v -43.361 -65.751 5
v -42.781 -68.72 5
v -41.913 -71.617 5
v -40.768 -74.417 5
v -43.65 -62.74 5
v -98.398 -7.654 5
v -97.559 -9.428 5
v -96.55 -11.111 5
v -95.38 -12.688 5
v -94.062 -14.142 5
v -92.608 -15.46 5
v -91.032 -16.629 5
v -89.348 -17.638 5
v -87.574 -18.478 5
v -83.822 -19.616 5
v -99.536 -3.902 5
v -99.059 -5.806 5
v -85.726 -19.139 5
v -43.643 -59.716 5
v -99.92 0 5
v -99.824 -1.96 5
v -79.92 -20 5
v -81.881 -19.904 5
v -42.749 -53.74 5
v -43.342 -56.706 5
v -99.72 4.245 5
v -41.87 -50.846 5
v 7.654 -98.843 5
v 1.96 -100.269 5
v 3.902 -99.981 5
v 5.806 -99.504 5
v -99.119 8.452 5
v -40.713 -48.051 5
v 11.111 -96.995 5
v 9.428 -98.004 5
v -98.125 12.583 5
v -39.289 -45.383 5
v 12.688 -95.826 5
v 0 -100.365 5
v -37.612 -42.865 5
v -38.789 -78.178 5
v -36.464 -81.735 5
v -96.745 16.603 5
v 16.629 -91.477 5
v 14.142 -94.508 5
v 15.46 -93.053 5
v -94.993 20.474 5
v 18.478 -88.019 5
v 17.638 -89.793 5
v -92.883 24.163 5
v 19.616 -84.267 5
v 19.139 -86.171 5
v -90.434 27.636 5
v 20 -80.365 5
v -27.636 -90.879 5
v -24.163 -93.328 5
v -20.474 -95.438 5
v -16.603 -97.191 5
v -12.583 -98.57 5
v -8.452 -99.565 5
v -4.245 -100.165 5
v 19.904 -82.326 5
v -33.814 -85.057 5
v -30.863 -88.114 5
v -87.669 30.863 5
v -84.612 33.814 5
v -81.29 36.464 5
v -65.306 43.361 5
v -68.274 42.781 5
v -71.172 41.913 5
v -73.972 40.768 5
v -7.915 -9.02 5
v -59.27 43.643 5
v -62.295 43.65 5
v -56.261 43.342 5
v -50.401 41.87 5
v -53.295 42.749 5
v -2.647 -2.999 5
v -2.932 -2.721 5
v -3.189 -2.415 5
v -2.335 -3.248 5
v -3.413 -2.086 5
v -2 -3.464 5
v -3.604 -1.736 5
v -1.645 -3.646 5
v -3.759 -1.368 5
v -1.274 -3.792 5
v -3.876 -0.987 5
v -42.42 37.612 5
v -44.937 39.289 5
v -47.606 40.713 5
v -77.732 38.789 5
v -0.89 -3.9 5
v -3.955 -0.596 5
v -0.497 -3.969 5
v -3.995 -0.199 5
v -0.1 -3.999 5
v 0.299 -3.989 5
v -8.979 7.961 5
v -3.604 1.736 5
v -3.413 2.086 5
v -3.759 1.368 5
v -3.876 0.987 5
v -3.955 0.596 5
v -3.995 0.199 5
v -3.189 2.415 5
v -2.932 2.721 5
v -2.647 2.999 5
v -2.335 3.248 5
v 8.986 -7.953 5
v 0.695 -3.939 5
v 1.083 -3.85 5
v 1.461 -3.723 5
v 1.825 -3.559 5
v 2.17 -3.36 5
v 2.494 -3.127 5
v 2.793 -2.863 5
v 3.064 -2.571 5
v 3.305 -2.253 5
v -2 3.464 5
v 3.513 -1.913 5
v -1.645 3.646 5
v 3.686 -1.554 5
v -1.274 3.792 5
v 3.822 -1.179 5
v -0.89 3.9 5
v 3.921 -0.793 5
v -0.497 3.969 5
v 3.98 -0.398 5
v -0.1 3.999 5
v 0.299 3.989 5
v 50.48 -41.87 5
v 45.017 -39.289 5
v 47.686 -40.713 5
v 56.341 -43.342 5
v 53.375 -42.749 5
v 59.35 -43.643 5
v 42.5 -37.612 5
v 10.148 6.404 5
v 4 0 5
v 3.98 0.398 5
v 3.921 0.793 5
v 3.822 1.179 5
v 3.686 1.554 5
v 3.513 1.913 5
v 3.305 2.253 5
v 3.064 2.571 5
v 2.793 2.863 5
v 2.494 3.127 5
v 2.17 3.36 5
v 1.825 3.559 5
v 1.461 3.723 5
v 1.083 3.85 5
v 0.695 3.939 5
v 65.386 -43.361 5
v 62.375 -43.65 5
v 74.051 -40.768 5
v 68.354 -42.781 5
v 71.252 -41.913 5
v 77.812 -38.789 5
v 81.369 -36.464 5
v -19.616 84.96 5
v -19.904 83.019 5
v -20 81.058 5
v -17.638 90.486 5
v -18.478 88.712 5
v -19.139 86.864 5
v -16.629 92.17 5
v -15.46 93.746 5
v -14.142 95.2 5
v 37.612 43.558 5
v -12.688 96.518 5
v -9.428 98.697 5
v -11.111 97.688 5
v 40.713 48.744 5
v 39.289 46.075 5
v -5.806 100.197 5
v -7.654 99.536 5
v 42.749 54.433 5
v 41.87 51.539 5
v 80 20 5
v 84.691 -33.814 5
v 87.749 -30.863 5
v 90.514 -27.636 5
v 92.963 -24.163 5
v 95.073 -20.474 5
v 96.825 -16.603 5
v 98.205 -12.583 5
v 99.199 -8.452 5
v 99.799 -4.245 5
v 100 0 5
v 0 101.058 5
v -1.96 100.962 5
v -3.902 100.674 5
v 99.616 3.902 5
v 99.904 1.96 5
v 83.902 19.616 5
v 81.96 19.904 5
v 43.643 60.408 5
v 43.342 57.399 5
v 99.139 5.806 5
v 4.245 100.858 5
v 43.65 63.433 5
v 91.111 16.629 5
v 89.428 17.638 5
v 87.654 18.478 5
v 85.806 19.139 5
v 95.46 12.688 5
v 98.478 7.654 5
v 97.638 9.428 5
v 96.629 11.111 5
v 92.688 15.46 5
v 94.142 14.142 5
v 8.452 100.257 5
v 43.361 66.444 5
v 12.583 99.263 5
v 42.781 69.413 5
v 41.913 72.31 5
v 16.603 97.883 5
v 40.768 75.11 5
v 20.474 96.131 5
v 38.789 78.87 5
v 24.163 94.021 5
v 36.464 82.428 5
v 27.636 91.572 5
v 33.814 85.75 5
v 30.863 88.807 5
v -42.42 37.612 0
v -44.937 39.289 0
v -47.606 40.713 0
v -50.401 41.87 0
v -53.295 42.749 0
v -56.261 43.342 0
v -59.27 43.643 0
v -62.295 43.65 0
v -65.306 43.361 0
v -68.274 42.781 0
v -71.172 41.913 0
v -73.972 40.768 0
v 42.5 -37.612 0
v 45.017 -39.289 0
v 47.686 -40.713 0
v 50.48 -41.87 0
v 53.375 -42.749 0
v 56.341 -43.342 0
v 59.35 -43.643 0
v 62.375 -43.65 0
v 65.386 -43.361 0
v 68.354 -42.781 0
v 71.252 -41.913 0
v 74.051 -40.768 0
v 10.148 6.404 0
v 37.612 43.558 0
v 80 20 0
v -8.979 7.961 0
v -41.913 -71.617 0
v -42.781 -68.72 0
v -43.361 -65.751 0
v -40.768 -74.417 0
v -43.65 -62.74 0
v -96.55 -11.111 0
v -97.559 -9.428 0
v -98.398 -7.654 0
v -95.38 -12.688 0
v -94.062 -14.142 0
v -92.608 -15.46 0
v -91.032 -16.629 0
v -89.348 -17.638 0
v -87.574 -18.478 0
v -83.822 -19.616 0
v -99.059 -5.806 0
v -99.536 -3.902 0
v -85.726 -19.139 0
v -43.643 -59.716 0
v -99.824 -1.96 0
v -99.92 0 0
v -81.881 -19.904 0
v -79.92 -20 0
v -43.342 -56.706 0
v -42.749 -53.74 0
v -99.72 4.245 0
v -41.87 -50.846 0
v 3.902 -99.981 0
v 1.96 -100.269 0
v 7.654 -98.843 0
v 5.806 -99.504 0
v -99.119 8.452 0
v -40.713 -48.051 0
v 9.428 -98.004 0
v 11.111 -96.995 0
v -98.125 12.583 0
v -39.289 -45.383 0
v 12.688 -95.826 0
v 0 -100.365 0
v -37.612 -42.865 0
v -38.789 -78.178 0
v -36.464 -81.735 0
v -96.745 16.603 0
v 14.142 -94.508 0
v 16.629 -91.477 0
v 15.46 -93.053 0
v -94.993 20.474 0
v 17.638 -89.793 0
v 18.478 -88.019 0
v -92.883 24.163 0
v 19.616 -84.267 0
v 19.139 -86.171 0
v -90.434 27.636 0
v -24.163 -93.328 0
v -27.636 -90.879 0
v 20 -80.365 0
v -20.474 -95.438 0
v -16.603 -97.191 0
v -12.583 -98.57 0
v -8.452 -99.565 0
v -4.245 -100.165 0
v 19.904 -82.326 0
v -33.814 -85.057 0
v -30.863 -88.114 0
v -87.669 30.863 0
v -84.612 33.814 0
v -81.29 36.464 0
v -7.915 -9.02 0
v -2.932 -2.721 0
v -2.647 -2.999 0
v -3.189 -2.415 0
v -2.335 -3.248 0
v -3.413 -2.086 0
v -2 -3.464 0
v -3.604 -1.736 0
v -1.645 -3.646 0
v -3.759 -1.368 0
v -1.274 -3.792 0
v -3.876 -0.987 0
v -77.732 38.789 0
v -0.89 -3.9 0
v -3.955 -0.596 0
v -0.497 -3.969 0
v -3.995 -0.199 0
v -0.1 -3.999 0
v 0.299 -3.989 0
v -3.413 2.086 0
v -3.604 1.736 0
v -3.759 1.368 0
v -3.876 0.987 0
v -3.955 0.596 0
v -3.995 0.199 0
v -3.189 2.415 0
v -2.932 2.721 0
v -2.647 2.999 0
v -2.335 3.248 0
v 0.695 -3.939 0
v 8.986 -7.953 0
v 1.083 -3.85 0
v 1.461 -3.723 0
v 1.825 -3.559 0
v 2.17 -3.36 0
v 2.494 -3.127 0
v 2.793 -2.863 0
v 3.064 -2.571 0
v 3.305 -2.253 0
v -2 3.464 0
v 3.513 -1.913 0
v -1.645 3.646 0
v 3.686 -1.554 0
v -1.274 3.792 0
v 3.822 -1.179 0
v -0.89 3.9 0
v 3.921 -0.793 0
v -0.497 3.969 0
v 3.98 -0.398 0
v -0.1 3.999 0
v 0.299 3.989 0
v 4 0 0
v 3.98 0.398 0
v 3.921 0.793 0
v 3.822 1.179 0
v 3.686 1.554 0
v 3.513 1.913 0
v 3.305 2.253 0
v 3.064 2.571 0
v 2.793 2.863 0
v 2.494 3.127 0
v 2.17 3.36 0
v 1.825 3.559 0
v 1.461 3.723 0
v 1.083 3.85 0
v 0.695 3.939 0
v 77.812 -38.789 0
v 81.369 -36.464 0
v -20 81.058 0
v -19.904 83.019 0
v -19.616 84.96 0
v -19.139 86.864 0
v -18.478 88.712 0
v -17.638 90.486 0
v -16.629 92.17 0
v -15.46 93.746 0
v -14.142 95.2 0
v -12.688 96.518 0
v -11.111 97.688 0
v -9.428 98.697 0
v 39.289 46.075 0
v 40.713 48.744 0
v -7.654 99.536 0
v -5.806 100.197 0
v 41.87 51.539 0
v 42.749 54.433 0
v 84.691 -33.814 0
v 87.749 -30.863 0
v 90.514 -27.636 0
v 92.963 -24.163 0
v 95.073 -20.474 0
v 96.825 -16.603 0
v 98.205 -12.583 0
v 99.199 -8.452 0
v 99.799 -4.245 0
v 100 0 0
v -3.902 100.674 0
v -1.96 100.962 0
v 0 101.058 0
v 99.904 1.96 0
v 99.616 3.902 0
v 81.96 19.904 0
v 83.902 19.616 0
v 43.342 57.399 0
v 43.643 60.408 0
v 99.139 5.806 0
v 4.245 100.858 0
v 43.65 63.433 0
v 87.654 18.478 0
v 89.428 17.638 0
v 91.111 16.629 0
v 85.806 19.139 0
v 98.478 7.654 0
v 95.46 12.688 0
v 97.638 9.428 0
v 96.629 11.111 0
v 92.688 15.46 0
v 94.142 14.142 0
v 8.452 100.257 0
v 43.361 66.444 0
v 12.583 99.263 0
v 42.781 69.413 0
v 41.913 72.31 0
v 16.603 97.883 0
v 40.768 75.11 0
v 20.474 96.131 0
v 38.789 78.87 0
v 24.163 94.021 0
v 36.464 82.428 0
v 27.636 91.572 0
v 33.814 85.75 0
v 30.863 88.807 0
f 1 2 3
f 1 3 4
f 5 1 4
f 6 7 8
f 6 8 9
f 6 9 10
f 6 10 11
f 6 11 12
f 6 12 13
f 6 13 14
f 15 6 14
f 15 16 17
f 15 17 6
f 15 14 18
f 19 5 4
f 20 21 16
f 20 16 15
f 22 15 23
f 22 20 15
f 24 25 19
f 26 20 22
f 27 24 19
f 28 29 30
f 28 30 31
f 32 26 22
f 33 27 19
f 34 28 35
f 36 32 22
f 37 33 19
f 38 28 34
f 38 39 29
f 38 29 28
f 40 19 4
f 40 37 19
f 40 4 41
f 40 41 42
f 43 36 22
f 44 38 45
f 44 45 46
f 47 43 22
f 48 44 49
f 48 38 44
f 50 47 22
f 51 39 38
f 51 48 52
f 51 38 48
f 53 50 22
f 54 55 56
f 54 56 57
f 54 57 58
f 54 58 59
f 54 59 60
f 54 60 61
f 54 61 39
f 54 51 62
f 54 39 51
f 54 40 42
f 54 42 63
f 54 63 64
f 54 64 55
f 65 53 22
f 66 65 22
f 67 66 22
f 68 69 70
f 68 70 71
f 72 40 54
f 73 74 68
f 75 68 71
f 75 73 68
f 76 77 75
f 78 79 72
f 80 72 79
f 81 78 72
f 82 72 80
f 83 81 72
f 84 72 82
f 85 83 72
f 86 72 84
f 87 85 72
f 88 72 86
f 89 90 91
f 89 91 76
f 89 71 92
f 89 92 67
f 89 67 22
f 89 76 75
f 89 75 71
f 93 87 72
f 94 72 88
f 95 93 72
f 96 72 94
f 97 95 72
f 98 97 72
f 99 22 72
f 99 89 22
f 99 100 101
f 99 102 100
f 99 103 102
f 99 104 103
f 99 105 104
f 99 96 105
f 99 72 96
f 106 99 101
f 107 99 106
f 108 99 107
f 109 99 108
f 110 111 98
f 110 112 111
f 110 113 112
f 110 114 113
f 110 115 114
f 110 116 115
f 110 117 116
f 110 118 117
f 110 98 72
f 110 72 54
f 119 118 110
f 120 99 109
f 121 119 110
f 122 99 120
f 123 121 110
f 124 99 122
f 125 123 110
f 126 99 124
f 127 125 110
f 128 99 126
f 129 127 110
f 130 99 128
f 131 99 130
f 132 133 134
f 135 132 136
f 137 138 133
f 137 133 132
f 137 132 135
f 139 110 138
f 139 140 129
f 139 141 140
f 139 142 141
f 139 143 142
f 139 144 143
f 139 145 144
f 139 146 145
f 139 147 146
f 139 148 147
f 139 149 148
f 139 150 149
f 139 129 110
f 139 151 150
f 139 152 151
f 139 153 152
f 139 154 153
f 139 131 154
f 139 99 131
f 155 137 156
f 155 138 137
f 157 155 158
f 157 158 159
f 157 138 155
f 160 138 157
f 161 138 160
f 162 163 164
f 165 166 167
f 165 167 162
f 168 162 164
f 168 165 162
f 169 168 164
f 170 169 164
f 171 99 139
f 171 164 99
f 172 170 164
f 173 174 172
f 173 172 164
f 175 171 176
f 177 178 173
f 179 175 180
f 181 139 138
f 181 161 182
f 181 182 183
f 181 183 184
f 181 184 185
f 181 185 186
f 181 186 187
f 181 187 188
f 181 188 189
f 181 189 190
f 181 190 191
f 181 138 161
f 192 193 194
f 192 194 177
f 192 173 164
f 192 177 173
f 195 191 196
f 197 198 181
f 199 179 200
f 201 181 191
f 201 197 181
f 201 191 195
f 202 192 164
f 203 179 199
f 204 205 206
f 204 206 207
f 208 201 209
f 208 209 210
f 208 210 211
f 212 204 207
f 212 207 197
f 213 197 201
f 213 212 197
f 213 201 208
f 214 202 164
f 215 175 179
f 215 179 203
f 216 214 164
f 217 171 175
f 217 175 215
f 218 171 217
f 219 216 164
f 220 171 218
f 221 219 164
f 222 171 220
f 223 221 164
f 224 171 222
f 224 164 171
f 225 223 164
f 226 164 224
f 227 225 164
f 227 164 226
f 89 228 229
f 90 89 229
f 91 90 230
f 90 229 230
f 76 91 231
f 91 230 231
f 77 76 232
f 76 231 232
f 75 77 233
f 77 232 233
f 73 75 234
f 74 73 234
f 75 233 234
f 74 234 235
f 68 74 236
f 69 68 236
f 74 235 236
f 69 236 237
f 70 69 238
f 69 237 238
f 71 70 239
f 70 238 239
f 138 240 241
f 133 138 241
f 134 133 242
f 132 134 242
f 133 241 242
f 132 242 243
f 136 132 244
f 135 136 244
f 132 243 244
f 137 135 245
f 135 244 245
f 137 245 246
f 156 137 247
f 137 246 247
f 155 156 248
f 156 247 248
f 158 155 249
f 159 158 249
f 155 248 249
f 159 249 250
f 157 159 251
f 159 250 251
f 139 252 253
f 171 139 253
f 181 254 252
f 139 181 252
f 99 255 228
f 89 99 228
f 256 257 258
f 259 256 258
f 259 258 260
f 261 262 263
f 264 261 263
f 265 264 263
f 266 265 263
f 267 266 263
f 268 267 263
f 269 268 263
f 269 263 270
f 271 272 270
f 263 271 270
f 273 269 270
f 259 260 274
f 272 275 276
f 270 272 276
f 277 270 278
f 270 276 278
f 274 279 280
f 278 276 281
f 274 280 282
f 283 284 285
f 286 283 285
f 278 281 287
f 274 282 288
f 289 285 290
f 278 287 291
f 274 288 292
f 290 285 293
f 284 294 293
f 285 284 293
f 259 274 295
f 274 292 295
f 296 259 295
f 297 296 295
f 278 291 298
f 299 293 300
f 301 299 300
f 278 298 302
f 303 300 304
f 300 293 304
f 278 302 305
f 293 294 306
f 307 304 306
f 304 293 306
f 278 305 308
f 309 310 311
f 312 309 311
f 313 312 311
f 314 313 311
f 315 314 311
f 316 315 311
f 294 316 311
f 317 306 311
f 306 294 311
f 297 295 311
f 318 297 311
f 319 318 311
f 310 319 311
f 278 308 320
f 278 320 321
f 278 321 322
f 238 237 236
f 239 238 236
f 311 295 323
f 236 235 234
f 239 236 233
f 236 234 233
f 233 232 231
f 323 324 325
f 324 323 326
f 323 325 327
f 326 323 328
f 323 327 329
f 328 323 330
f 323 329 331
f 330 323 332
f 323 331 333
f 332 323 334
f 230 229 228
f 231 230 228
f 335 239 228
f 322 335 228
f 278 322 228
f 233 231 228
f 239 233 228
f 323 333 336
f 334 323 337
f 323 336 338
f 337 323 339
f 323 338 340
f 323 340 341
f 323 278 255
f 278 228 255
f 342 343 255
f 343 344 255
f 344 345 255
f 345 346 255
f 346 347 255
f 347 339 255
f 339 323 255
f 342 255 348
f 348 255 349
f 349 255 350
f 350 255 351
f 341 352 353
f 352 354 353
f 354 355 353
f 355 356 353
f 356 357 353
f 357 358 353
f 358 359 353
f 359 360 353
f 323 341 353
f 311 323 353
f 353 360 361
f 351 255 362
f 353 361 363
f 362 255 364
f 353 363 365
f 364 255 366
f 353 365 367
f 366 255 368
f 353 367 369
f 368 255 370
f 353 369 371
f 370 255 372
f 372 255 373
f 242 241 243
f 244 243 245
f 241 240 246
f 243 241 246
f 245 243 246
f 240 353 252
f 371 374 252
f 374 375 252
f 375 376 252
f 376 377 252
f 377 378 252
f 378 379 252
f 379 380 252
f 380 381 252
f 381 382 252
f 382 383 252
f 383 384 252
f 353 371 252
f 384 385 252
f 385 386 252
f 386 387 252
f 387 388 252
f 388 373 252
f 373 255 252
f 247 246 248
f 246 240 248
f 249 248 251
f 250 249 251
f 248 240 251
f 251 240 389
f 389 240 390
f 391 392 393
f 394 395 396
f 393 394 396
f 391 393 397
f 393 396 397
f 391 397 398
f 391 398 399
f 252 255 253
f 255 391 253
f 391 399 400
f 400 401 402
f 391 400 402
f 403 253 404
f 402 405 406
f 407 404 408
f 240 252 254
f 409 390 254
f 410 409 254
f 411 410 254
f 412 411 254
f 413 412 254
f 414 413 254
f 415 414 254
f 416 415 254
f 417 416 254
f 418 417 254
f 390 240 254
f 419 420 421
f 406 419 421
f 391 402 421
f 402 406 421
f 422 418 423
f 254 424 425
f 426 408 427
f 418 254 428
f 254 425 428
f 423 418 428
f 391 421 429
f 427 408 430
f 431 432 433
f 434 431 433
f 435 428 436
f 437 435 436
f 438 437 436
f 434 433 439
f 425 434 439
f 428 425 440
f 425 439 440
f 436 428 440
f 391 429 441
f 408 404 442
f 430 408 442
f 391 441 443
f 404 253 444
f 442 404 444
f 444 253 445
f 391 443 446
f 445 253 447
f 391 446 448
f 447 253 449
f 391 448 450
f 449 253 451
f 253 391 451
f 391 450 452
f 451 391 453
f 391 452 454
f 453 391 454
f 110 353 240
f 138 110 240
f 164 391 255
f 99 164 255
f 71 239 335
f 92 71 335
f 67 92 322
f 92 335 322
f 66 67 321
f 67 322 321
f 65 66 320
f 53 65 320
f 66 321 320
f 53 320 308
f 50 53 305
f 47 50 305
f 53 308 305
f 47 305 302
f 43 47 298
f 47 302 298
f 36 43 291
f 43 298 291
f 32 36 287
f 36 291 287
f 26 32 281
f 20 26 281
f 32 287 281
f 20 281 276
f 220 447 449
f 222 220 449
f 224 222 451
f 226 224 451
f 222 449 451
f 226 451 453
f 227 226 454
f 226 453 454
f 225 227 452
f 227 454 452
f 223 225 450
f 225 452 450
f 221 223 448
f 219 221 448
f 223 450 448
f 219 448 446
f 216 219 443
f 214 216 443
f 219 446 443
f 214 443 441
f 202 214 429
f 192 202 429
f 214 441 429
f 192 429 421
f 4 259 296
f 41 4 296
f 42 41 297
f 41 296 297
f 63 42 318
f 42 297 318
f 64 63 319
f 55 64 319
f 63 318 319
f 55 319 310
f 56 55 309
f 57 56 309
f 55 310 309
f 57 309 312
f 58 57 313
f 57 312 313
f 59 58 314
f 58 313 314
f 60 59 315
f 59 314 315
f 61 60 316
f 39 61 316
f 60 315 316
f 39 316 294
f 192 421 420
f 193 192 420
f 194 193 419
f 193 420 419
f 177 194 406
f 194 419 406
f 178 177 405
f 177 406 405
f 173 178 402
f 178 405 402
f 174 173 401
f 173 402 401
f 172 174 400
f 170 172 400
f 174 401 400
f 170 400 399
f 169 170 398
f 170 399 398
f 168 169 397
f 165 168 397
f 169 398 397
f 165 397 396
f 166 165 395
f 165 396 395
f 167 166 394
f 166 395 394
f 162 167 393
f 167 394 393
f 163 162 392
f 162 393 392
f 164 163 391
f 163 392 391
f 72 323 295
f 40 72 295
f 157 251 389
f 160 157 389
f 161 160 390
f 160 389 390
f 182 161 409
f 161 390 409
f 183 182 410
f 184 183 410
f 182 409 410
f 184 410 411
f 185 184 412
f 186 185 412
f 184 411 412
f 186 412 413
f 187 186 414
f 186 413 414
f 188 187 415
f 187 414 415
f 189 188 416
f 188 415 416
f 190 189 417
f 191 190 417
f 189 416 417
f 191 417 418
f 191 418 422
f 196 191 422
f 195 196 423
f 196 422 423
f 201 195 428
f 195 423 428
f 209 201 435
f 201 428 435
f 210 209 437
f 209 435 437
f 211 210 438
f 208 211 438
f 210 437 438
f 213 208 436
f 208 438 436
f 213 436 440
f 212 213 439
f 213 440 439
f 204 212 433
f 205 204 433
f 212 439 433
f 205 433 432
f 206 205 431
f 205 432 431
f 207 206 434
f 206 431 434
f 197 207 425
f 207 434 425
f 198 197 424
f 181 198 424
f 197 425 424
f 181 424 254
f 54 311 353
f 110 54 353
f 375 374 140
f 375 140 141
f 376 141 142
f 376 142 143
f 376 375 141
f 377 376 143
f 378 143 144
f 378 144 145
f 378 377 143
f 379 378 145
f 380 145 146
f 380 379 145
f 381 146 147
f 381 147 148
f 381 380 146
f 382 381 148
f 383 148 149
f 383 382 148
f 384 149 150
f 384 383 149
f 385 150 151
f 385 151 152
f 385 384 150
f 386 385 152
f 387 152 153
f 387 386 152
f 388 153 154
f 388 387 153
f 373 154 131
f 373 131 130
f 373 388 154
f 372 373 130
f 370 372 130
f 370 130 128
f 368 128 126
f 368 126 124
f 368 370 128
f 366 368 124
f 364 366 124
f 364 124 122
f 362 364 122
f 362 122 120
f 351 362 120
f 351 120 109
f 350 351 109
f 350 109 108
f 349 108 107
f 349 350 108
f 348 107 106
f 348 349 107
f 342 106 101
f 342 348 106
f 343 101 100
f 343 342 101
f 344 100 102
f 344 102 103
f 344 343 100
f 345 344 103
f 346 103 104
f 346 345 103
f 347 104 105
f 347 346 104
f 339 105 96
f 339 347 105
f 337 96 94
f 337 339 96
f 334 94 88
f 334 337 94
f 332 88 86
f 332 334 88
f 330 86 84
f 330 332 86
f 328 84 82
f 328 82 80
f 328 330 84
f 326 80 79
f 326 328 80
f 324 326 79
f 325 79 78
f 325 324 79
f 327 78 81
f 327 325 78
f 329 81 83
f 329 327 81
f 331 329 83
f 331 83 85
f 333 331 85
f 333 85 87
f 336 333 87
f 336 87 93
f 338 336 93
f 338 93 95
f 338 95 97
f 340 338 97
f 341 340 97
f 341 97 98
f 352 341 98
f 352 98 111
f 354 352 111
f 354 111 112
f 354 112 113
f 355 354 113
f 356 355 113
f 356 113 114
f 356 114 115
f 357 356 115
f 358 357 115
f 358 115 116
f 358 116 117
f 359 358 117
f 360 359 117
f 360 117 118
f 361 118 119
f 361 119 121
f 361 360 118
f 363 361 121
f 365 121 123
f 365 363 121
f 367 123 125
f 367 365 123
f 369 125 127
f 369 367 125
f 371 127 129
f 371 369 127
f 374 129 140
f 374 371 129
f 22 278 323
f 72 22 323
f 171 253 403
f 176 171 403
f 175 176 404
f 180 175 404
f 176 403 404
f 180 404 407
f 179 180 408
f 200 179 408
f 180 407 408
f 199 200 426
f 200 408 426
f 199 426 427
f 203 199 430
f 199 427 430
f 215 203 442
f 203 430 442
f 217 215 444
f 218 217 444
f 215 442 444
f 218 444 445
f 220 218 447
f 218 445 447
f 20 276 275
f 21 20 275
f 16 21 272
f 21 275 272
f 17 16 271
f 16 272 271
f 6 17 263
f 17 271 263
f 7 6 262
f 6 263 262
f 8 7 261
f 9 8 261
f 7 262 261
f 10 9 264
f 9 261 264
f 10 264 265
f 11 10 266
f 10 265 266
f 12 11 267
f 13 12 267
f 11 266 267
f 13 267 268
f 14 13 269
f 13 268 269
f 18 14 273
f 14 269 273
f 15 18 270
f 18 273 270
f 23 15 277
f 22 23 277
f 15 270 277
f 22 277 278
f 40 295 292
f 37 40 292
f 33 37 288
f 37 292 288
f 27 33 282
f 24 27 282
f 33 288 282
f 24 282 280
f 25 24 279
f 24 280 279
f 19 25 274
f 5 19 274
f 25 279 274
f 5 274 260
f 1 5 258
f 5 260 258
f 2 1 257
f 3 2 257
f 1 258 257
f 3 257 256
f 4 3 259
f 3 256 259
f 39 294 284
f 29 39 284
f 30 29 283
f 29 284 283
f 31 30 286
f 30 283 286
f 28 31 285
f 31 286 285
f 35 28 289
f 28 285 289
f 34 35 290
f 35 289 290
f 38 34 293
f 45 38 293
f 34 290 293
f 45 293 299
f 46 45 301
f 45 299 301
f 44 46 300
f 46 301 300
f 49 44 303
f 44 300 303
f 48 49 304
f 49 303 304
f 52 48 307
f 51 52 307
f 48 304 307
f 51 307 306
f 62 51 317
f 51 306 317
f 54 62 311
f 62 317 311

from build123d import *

# Parameters (mm, degrees)
SKETCH2_R           = 12
SKETCH2_R_2         = 4
BOSS_EXTRUDE1_DEPTH = 5


with BuildPart() as part:
    # Sketch2 → Boss-Extrude1 (new body)
    # profile 1 of 5: a face of its own
    with BuildSketch(Plane.XY):
        with BuildLine():
            ThreePointArc((0, 101.058278507), (-14.142135624, 95.200414131), (-20, 81.058278507))
            Line((-20, 81.058278507), (-8.978854785, 7.961166168))
            ThreePointArc((-8.978854785, 7.961166168), (0.973561331, 11.96044223), (10.148177695, 6.404255575))
            Line((10.148177695, 6.404255575), (37.612146598, 43.558278507))
            ThreePointArc((37.612146598, 43.558278507), (43.529493891, 58.89995601), (40.768147941, 75.109738122))
            ThreePointArc((40.768147941, 75.109738122), (24.162825966, 94.020863263), (0, 101.058278507))
        make_face()
    # profile 2 of 5: a face of its own
    with BuildSketch(Plane.XY):
        with BuildLine():
            ThreePointArc((-7.914553223, -9.019969361), (-11.976499885, -0.750633402), (-8.978854785, 7.961166168))
            Line((-8.978854785, 7.961166168), (-42.420167513, 37.612146598))
            ThreePointArc((-42.420167513, 37.612146598), (-57.761845016, 43.529493891), (-73.971627128, 40.768147941))
            ThreePointArc((-73.971627128, 40.768147941), (-92.882752269, 24.162825966), (-99.920167513, 0))
            ThreePointArc((-99.920167513, 0), (-94.062303137, -14.142135624), (-79.920167513, -20))
            Line((-79.920167513, -20), (-7.914553223, -9.019969361))
        make_face()
    # profile 3 of 5: a face of its own
    with BuildSketch(Plane.XY):
        with BuildLine():
            Line((80, 20), (10.148177695, 6.404255575))
            ThreePointArc((10.148177695, 6.404255575), (11.527752, 3.333306741), (12, 0))
            ThreePointArc((12, 0), (11.221304846, -4.252330837), (8.986280409, -7.952783438))
            Line((8.986280409, -7.952783438), (42.5, -37.612146598))
            ThreePointArc((42.5, -37.612146598), (57.841677503, -43.529493891), (74.051459615, -40.768147941))
            ThreePointArc((74.051459615, -40.768147941), (92.962584756, -24.162825966), (100, 0))
            ThreePointArc((100, 0), (94.142135624, 14.142135624), (80, 20))
        make_face()
    # profile 4 of 5: a face of its own
    with BuildSketch(Plane.XY):
        with BuildLine():
            ThreePointArc((8.986280409, -7.952783438), (0.756221686, -11.976148327), (-7.914553223, -9.019969361))
            Line((-7.914553223, -9.019969361), (-37.612146598, -42.865389918))
            ThreePointArc((-37.612146598, -42.865389918), (-43.529493891, -58.207067421), (-40.768147941, -74.416849533))
            ThreePointArc((-40.768147941, -74.416849533), (-24.162825966, -93.327974674), (0, -100.365389918))
            ThreePointArc((0, -100.365389918), (14.142135624, -94.507525542), (20, -80.365389918))
            Line((20, -80.365389918), (8.986280409, -7.952783438))
        make_face()
    # profile 5 of 5: a face of its own
    with BuildSketch(Plane.XY):
        Circle(SKETCH2_R)
        Circle(SKETCH2_R_2, mode=Mode.SUBTRACT)
    extrude(amount=BOSS_EXTRUDE1_DEPTH)


solid = part.part
